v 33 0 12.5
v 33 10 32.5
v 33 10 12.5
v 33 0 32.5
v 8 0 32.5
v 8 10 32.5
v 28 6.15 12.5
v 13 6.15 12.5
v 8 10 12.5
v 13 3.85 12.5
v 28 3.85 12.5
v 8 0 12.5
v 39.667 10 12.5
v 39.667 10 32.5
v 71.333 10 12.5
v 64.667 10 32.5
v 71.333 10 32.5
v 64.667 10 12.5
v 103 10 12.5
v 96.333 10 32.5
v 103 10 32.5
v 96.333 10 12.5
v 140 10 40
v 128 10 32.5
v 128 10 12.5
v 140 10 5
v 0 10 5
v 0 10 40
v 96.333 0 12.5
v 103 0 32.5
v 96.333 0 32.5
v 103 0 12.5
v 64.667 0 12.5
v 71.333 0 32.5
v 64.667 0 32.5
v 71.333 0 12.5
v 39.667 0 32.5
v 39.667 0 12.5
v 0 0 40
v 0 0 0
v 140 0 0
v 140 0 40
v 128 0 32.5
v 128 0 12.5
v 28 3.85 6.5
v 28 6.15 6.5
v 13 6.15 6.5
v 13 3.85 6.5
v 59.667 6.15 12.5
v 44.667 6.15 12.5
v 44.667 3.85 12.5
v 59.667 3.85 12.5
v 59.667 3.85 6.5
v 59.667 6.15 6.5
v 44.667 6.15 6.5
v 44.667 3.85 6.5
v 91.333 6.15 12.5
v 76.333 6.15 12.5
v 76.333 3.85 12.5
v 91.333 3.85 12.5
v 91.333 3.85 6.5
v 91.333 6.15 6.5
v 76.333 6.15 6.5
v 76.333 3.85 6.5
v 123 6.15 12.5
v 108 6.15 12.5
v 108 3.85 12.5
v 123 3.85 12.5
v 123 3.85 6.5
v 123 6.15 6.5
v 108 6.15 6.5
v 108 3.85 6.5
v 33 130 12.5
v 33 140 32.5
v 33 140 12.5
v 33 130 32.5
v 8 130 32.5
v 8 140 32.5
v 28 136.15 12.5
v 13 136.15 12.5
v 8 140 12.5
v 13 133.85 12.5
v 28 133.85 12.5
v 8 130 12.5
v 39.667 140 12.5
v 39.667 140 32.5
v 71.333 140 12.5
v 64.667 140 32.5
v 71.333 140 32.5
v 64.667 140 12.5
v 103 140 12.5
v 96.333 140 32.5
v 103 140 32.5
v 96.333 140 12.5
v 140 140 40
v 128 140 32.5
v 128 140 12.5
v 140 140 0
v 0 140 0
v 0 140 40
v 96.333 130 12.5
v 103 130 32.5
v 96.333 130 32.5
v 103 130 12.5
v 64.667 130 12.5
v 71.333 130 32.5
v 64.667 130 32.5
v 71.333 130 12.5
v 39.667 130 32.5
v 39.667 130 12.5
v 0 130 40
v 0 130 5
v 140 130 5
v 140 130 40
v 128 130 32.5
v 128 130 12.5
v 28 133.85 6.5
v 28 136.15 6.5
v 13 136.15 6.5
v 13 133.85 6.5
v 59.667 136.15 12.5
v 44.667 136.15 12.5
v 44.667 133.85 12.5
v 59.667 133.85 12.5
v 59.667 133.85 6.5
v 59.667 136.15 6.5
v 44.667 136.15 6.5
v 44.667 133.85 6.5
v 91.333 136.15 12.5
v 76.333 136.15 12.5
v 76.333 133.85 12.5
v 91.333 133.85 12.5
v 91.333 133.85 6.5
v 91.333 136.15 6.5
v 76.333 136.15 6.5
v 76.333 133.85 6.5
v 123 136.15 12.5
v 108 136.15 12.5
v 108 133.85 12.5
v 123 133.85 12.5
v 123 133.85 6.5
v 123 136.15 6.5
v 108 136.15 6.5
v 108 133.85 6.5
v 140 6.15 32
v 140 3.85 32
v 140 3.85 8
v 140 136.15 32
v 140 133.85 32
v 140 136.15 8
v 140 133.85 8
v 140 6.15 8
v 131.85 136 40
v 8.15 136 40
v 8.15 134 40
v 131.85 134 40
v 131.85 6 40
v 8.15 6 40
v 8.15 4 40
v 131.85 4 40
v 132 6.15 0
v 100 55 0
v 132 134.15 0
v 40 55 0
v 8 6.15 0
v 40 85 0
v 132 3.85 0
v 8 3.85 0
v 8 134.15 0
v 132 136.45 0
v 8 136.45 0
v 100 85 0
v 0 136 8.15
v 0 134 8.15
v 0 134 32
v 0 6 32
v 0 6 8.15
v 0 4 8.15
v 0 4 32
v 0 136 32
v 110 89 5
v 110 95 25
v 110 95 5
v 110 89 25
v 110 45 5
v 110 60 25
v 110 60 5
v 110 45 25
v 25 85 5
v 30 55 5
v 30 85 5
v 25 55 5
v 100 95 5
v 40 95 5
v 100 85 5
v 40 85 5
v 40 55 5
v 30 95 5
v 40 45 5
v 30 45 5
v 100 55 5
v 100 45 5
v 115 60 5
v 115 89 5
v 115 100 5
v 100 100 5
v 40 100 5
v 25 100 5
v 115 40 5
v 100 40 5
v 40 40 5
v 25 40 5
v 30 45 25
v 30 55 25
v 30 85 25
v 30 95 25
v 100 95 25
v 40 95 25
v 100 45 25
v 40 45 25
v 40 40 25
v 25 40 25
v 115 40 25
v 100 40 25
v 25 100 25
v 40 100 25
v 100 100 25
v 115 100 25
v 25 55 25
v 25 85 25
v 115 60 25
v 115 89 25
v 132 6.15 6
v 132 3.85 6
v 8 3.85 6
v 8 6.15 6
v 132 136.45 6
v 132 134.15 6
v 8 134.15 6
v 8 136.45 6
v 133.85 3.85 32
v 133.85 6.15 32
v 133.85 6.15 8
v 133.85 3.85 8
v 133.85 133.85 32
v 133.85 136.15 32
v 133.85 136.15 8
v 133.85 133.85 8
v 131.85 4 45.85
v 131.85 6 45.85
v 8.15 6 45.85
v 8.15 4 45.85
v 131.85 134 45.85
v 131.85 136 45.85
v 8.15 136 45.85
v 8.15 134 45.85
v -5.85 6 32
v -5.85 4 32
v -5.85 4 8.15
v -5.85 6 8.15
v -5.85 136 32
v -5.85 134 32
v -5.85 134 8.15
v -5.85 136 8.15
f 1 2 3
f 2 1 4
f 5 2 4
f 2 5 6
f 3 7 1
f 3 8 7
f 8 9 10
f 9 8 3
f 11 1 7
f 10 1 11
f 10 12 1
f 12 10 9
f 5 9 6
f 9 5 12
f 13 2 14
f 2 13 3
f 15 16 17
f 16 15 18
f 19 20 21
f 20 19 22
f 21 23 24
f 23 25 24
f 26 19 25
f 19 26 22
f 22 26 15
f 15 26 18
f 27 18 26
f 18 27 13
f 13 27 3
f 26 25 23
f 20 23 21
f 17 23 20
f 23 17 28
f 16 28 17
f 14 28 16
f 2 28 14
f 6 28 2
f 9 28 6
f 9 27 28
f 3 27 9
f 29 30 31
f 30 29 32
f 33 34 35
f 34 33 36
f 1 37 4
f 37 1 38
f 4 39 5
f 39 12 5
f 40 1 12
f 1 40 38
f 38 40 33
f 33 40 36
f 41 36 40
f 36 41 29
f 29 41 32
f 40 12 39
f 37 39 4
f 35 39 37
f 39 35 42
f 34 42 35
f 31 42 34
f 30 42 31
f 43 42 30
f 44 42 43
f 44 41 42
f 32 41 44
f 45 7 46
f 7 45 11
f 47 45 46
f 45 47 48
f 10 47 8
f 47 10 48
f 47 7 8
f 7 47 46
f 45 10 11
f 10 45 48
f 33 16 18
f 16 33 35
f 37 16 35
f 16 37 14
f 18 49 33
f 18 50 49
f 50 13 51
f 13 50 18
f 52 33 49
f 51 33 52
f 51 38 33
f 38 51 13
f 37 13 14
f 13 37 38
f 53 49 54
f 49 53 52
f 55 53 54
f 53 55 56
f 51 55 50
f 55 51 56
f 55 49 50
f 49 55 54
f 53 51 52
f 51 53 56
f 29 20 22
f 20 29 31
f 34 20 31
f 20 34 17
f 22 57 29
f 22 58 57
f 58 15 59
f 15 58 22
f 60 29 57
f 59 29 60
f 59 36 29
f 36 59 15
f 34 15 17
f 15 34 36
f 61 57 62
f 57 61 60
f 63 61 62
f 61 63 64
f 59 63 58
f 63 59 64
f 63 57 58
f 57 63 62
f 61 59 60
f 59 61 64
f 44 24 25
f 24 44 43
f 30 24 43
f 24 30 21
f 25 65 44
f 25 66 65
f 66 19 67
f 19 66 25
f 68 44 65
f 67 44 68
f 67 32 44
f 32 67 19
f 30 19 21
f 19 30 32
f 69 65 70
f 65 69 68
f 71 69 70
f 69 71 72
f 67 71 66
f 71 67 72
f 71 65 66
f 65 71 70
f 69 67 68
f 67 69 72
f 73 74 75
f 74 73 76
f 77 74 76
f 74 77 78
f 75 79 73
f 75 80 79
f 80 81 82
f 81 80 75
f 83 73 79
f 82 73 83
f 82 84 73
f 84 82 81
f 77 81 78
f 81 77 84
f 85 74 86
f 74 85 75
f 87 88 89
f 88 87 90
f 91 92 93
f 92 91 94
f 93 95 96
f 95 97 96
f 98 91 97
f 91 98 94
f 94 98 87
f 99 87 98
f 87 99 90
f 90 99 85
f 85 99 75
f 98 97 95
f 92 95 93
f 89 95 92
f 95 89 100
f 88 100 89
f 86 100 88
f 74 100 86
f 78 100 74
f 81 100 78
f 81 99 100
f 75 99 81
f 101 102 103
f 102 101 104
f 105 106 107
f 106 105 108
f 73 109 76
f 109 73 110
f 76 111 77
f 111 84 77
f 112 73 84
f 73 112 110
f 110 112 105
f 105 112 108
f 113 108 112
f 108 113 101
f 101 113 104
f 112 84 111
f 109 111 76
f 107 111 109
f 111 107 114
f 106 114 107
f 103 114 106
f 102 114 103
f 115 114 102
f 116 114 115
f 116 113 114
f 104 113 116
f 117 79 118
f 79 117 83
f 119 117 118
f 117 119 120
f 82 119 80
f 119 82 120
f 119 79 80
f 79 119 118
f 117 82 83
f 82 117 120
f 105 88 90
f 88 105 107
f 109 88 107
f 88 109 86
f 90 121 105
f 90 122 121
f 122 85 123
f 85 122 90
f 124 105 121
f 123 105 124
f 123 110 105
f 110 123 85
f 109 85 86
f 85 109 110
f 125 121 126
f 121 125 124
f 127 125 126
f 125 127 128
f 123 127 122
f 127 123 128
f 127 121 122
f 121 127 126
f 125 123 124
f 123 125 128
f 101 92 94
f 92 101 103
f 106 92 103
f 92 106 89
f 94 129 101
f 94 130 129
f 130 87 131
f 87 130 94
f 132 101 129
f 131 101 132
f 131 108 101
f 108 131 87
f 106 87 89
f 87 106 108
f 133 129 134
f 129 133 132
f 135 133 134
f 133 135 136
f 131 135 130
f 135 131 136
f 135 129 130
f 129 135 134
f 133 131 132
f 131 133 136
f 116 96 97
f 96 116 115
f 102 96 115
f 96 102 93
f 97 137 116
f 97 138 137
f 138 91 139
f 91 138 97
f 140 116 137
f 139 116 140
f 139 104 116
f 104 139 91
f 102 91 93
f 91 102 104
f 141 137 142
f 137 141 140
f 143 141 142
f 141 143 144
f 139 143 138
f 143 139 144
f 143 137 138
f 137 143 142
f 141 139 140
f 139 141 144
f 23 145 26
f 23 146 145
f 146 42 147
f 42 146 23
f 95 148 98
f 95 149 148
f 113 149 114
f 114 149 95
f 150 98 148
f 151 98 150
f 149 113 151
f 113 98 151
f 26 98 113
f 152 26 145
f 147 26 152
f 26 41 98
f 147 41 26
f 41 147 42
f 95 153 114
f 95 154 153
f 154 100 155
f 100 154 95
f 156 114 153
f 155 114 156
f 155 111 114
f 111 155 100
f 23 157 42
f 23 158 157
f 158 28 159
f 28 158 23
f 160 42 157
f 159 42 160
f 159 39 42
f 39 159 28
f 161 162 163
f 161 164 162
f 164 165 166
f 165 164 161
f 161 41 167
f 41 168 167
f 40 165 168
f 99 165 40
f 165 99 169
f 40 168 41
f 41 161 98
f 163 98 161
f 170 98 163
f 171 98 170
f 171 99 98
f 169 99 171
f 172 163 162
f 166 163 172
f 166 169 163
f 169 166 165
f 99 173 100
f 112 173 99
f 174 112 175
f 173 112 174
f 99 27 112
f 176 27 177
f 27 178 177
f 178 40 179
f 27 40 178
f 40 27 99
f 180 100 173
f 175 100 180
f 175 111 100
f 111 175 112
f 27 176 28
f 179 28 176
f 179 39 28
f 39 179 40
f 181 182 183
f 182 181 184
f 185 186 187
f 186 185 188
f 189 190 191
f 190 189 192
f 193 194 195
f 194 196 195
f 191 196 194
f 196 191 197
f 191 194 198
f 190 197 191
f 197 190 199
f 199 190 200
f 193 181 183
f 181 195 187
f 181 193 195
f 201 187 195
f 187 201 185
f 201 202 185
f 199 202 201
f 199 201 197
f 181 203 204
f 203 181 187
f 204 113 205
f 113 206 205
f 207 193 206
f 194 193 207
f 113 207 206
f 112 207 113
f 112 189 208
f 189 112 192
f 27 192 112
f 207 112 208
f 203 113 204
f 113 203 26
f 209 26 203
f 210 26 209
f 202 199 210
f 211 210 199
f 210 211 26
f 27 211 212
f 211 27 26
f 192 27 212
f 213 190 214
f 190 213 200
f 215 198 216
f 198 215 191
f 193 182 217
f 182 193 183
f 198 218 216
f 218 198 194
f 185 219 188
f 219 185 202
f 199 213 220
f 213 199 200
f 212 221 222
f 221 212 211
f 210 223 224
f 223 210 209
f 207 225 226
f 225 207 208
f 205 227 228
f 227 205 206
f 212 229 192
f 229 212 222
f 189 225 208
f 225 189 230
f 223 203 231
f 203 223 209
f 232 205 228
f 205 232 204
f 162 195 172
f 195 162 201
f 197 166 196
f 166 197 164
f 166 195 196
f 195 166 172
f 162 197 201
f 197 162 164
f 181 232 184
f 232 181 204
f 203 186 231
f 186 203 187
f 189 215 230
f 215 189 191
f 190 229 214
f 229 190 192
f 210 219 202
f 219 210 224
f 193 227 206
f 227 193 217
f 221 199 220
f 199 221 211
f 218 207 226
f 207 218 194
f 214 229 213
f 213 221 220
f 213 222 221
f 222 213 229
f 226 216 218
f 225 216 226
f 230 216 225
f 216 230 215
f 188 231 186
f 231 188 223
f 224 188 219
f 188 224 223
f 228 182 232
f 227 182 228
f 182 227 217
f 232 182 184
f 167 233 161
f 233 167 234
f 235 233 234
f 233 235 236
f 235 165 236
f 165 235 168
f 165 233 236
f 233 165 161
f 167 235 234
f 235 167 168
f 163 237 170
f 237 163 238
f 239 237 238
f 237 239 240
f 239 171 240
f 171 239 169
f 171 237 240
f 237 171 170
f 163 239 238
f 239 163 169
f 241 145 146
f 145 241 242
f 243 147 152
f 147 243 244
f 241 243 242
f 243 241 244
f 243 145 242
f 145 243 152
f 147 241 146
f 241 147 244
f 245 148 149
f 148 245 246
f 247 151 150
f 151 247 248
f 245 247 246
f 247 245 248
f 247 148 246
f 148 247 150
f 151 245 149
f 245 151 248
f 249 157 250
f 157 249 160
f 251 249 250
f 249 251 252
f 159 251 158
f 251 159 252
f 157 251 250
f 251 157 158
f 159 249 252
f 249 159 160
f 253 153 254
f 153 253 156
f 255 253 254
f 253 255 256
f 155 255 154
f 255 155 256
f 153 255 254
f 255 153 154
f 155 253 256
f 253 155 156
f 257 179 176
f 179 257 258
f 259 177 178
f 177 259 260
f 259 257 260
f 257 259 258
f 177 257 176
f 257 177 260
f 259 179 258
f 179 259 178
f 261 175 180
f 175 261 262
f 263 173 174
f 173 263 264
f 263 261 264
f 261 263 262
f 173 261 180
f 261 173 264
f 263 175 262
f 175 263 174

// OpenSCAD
// Board dimensions
internal_length = 80;
internal_width = 50;

external_length = 140;
external_width = 140;

// Espessura das paredes e base
start_inside_cube_x = (external_length - internal_length)/2;
start_inside_cube_y = (external_width - internal_width)/2;
base_thickness = 5;


// Total height of the support
total_height = 40;

base_size = 10;

left_distance = 15;
right_distance = 6;
wall_thickness_corner = 10;

pin_width = 2;
hole_heigth = 6;

wall_thickness_external = 10;
wall_thickness_internal = 5;

space_beetween_hole_pin = 0.15;

distance_major_hole = 0.8*wall_thickness_external;
distance_minor_hole = (wall_thickness_external - pin_width - 2*space_beetween_hole_pin)/2;

module support() {
    // External box
    difference() {
        cube([external_length, external_width, total_height]);

        // Internal box
        translate([start_inside_cube_x, start_inside_cube_y, base_thickness])
            cube([internal_length, internal_width, total_height - base_thickness]);
        
        // Remove left wall
        translate([0, wall_thickness_external, base_thickness])
            cube([external_length, start_inside_cube_y - wall_thickness_external - wall_thickness_internal, total_height - base_thickness]);

        // Remove right wall
        translate([0, start_inside_cube_y + internal_width + wall_thickness_internal, base_thickness])
            cube([external_length, start_inside_cube_y - wall_thickness_external - wall_thickness_internal, total_height - base_thickness]);

        // Remove back wall
        translate([0, wall_thickness_external, base_thickness])
            cube([start_inside_cube_x - wall_thickness_internal, external_width - 2*wall_thickness_external, total_height - base_thickness]);

        // Remove front wall
        translate([external_width - start_inside_cube_x + wall_thickness_internal, wall_thickness_external, base_thickness])
            cube([start_inside_cube_x - wall_thickness_internal, external_width - 2*wall_thickness_external, total_height - base_thickness]);
        
        // Internal hole on the floor for board
        translate([start_inside_cube_x+base_size, start_inside_cube_y+base_size])
            cube([internal_length-2*base_size, internal_width-2*base_size, total_height - base_thickness]);

        // Remove front wall on internal box
        translate([start_inside_cube_x + internal_length, start_inside_cube_y + left_distance, base_thickness])
            cube([wall_thickness_internal, internal_width - left_distance - right_distance, total_height - base_thickness]);

        // Remove back wall on internal box
        translate([start_inside_cube_x - wall_thickness_internal, start_inside_cube_y + wall_thickness_corner, base_thickness])
            cube([wall_thickness_internal, internal_width - 2*wall_thickness_corner, total_height - base_thickness]);

        // Remove lateral walls on internal box
        translate([start_inside_cube_x + wall_thickness_corner, wall_thickness_external, base_thickness])
            cube([internal_length - 2*wall_thickness_corner, external_width -2*wall_thickness_external, total_height - base_thickness]);

        // Remove roof of internal box
        translate([wall_thickness_external, wall_thickness_external, base_thickness + total_height/2])
            cube([external_length - 2*wall_thickness_external, external_width - 2*wall_thickness_external, total_height/2]);

        // Hole on the floor, left side
        translate([distance_major_hole, distance_minor_hole, 0])
            cube([external_length - 2 * distance_major_hole, pin_width + 2*space_beetween_hole_pin, hole_heigth]);

        // Hole on the floor, right side
        translate([distance_major_hole, external_width - distance_minor_hole - pin_width, 0])
            cube([external_length - 2 * distance_major_hole, pin_width + 2*space_beetween_hole_pin, hole_heigth]);

        // Hole on the front, left side
        translate([external_length - hole_heigth - space_beetween_hole_pin, distance_minor_hole, distance_major_hole])
            cube([external_length - hole_heigth - space_beetween_hole_pin, pin_width + 2*space_beetween_hole_pin, total_height - 2*distance_major_hole]);

        // Hole on the front, right side
        translate([external_length - hole_heigth - space_beetween_hole_pin, external_width - distance_minor_hole - 2*space_beetween_hole_pin - pin_width, distance_major_hole])
            cube([external_length - hole_heigth - space_beetween_hole_pin, pin_width + 2 * space_beetween_hole_pin, total_height - 2*distance_major_hole]);

        square_size = 25;
        space_between = (external_length - 2 * wall_thickness_external - 4 * square_size) / 3;

        // Square holes on left side
        for (i = [0:3]) {
            translate([0.8*wall_thickness_external + i * (square_size + space_between), 0, 2.5*base_thickness])
            cube([square_size, wall_thickness_external, total_height - 1*wall_thickness_external -  2*base_thickness]);

            translate([0.8*wall_thickness_external + i * (square_size + space_between) + 0.5*wall_thickness_external, distance_minor_hole, 2.5*base_thickness - hole_heigth])
            cube([square_size - wall_thickness_external, pin_width + 2*space_beetween_hole_pin, hole_heigth]);
        }

        // Square holes on right side
        for (i = [0:3]) {
            translate([0.8*wall_thickness_external + i * (square_size + space_between), external_length - wall_thickness_external, 2.5*base_thickness])
            cube([square_size, wall_thickness_external, total_height - 1*wall_thickness_external -  2*base_thickness]);

            translate([0.8*wall_thickness_external + i * (square_size + space_between) + 0.5*wall_thickness_external, external_length - wall_thickness_external + distance_minor_hole, 2.5*base_thickness - hole_heigth])
            cube([square_size - wall_thickness_external, pin_width + 2*space_beetween_hole_pin, hole_heigth]);
        }

    }

    // Pin on roof, left side
        translate([distance_major_hole + space_beetween_hole_pin, distance_minor_hole + space_beetween_hole_pin, total_height])
            cube([external_length - 2*distance_major_hole - 2*space_beetween_hole_pin, pin_width, hole_heigth - space_beetween_hole_pin]);
    
    // Pin on roof, right side
        translate([distance_major_hole + space_beetween_hole_pin, external_width - distance_minor_hole - space_beetween_hole_pin - pin_width, total_height])
            cube([external_length - 2*distance_major_hole - 2*space_beetween_hole_pin, pin_width, hole_heigth - space_beetween_hole_pin]);
    
    // Pin on back, left side
        translate([-(hole_heigth - space_beetween_hole_pin), distance_minor_hole + space_beetween_hole_pin, distance_major_hole + space_beetween_hole_pin])
            cube([hole_heigth - space_beetween_hole_pin, pin_width, total_height - 2*distance_major_hole - space_beetween_hole_pin]);

    // Pin on back, right side
        translate([-(hole_heigth - space_beetween_hole_pin), external_width - distance_minor_hole - space_beetween_hole_pin - pin_width, distance_major_hole + space_beetween_hole_pin])
            cube([hole_heigth - space_beetween_hole_pin, pin_width, total_height - 2*distance_major_hole - space_beetween_hole_pin]);
}

support();
